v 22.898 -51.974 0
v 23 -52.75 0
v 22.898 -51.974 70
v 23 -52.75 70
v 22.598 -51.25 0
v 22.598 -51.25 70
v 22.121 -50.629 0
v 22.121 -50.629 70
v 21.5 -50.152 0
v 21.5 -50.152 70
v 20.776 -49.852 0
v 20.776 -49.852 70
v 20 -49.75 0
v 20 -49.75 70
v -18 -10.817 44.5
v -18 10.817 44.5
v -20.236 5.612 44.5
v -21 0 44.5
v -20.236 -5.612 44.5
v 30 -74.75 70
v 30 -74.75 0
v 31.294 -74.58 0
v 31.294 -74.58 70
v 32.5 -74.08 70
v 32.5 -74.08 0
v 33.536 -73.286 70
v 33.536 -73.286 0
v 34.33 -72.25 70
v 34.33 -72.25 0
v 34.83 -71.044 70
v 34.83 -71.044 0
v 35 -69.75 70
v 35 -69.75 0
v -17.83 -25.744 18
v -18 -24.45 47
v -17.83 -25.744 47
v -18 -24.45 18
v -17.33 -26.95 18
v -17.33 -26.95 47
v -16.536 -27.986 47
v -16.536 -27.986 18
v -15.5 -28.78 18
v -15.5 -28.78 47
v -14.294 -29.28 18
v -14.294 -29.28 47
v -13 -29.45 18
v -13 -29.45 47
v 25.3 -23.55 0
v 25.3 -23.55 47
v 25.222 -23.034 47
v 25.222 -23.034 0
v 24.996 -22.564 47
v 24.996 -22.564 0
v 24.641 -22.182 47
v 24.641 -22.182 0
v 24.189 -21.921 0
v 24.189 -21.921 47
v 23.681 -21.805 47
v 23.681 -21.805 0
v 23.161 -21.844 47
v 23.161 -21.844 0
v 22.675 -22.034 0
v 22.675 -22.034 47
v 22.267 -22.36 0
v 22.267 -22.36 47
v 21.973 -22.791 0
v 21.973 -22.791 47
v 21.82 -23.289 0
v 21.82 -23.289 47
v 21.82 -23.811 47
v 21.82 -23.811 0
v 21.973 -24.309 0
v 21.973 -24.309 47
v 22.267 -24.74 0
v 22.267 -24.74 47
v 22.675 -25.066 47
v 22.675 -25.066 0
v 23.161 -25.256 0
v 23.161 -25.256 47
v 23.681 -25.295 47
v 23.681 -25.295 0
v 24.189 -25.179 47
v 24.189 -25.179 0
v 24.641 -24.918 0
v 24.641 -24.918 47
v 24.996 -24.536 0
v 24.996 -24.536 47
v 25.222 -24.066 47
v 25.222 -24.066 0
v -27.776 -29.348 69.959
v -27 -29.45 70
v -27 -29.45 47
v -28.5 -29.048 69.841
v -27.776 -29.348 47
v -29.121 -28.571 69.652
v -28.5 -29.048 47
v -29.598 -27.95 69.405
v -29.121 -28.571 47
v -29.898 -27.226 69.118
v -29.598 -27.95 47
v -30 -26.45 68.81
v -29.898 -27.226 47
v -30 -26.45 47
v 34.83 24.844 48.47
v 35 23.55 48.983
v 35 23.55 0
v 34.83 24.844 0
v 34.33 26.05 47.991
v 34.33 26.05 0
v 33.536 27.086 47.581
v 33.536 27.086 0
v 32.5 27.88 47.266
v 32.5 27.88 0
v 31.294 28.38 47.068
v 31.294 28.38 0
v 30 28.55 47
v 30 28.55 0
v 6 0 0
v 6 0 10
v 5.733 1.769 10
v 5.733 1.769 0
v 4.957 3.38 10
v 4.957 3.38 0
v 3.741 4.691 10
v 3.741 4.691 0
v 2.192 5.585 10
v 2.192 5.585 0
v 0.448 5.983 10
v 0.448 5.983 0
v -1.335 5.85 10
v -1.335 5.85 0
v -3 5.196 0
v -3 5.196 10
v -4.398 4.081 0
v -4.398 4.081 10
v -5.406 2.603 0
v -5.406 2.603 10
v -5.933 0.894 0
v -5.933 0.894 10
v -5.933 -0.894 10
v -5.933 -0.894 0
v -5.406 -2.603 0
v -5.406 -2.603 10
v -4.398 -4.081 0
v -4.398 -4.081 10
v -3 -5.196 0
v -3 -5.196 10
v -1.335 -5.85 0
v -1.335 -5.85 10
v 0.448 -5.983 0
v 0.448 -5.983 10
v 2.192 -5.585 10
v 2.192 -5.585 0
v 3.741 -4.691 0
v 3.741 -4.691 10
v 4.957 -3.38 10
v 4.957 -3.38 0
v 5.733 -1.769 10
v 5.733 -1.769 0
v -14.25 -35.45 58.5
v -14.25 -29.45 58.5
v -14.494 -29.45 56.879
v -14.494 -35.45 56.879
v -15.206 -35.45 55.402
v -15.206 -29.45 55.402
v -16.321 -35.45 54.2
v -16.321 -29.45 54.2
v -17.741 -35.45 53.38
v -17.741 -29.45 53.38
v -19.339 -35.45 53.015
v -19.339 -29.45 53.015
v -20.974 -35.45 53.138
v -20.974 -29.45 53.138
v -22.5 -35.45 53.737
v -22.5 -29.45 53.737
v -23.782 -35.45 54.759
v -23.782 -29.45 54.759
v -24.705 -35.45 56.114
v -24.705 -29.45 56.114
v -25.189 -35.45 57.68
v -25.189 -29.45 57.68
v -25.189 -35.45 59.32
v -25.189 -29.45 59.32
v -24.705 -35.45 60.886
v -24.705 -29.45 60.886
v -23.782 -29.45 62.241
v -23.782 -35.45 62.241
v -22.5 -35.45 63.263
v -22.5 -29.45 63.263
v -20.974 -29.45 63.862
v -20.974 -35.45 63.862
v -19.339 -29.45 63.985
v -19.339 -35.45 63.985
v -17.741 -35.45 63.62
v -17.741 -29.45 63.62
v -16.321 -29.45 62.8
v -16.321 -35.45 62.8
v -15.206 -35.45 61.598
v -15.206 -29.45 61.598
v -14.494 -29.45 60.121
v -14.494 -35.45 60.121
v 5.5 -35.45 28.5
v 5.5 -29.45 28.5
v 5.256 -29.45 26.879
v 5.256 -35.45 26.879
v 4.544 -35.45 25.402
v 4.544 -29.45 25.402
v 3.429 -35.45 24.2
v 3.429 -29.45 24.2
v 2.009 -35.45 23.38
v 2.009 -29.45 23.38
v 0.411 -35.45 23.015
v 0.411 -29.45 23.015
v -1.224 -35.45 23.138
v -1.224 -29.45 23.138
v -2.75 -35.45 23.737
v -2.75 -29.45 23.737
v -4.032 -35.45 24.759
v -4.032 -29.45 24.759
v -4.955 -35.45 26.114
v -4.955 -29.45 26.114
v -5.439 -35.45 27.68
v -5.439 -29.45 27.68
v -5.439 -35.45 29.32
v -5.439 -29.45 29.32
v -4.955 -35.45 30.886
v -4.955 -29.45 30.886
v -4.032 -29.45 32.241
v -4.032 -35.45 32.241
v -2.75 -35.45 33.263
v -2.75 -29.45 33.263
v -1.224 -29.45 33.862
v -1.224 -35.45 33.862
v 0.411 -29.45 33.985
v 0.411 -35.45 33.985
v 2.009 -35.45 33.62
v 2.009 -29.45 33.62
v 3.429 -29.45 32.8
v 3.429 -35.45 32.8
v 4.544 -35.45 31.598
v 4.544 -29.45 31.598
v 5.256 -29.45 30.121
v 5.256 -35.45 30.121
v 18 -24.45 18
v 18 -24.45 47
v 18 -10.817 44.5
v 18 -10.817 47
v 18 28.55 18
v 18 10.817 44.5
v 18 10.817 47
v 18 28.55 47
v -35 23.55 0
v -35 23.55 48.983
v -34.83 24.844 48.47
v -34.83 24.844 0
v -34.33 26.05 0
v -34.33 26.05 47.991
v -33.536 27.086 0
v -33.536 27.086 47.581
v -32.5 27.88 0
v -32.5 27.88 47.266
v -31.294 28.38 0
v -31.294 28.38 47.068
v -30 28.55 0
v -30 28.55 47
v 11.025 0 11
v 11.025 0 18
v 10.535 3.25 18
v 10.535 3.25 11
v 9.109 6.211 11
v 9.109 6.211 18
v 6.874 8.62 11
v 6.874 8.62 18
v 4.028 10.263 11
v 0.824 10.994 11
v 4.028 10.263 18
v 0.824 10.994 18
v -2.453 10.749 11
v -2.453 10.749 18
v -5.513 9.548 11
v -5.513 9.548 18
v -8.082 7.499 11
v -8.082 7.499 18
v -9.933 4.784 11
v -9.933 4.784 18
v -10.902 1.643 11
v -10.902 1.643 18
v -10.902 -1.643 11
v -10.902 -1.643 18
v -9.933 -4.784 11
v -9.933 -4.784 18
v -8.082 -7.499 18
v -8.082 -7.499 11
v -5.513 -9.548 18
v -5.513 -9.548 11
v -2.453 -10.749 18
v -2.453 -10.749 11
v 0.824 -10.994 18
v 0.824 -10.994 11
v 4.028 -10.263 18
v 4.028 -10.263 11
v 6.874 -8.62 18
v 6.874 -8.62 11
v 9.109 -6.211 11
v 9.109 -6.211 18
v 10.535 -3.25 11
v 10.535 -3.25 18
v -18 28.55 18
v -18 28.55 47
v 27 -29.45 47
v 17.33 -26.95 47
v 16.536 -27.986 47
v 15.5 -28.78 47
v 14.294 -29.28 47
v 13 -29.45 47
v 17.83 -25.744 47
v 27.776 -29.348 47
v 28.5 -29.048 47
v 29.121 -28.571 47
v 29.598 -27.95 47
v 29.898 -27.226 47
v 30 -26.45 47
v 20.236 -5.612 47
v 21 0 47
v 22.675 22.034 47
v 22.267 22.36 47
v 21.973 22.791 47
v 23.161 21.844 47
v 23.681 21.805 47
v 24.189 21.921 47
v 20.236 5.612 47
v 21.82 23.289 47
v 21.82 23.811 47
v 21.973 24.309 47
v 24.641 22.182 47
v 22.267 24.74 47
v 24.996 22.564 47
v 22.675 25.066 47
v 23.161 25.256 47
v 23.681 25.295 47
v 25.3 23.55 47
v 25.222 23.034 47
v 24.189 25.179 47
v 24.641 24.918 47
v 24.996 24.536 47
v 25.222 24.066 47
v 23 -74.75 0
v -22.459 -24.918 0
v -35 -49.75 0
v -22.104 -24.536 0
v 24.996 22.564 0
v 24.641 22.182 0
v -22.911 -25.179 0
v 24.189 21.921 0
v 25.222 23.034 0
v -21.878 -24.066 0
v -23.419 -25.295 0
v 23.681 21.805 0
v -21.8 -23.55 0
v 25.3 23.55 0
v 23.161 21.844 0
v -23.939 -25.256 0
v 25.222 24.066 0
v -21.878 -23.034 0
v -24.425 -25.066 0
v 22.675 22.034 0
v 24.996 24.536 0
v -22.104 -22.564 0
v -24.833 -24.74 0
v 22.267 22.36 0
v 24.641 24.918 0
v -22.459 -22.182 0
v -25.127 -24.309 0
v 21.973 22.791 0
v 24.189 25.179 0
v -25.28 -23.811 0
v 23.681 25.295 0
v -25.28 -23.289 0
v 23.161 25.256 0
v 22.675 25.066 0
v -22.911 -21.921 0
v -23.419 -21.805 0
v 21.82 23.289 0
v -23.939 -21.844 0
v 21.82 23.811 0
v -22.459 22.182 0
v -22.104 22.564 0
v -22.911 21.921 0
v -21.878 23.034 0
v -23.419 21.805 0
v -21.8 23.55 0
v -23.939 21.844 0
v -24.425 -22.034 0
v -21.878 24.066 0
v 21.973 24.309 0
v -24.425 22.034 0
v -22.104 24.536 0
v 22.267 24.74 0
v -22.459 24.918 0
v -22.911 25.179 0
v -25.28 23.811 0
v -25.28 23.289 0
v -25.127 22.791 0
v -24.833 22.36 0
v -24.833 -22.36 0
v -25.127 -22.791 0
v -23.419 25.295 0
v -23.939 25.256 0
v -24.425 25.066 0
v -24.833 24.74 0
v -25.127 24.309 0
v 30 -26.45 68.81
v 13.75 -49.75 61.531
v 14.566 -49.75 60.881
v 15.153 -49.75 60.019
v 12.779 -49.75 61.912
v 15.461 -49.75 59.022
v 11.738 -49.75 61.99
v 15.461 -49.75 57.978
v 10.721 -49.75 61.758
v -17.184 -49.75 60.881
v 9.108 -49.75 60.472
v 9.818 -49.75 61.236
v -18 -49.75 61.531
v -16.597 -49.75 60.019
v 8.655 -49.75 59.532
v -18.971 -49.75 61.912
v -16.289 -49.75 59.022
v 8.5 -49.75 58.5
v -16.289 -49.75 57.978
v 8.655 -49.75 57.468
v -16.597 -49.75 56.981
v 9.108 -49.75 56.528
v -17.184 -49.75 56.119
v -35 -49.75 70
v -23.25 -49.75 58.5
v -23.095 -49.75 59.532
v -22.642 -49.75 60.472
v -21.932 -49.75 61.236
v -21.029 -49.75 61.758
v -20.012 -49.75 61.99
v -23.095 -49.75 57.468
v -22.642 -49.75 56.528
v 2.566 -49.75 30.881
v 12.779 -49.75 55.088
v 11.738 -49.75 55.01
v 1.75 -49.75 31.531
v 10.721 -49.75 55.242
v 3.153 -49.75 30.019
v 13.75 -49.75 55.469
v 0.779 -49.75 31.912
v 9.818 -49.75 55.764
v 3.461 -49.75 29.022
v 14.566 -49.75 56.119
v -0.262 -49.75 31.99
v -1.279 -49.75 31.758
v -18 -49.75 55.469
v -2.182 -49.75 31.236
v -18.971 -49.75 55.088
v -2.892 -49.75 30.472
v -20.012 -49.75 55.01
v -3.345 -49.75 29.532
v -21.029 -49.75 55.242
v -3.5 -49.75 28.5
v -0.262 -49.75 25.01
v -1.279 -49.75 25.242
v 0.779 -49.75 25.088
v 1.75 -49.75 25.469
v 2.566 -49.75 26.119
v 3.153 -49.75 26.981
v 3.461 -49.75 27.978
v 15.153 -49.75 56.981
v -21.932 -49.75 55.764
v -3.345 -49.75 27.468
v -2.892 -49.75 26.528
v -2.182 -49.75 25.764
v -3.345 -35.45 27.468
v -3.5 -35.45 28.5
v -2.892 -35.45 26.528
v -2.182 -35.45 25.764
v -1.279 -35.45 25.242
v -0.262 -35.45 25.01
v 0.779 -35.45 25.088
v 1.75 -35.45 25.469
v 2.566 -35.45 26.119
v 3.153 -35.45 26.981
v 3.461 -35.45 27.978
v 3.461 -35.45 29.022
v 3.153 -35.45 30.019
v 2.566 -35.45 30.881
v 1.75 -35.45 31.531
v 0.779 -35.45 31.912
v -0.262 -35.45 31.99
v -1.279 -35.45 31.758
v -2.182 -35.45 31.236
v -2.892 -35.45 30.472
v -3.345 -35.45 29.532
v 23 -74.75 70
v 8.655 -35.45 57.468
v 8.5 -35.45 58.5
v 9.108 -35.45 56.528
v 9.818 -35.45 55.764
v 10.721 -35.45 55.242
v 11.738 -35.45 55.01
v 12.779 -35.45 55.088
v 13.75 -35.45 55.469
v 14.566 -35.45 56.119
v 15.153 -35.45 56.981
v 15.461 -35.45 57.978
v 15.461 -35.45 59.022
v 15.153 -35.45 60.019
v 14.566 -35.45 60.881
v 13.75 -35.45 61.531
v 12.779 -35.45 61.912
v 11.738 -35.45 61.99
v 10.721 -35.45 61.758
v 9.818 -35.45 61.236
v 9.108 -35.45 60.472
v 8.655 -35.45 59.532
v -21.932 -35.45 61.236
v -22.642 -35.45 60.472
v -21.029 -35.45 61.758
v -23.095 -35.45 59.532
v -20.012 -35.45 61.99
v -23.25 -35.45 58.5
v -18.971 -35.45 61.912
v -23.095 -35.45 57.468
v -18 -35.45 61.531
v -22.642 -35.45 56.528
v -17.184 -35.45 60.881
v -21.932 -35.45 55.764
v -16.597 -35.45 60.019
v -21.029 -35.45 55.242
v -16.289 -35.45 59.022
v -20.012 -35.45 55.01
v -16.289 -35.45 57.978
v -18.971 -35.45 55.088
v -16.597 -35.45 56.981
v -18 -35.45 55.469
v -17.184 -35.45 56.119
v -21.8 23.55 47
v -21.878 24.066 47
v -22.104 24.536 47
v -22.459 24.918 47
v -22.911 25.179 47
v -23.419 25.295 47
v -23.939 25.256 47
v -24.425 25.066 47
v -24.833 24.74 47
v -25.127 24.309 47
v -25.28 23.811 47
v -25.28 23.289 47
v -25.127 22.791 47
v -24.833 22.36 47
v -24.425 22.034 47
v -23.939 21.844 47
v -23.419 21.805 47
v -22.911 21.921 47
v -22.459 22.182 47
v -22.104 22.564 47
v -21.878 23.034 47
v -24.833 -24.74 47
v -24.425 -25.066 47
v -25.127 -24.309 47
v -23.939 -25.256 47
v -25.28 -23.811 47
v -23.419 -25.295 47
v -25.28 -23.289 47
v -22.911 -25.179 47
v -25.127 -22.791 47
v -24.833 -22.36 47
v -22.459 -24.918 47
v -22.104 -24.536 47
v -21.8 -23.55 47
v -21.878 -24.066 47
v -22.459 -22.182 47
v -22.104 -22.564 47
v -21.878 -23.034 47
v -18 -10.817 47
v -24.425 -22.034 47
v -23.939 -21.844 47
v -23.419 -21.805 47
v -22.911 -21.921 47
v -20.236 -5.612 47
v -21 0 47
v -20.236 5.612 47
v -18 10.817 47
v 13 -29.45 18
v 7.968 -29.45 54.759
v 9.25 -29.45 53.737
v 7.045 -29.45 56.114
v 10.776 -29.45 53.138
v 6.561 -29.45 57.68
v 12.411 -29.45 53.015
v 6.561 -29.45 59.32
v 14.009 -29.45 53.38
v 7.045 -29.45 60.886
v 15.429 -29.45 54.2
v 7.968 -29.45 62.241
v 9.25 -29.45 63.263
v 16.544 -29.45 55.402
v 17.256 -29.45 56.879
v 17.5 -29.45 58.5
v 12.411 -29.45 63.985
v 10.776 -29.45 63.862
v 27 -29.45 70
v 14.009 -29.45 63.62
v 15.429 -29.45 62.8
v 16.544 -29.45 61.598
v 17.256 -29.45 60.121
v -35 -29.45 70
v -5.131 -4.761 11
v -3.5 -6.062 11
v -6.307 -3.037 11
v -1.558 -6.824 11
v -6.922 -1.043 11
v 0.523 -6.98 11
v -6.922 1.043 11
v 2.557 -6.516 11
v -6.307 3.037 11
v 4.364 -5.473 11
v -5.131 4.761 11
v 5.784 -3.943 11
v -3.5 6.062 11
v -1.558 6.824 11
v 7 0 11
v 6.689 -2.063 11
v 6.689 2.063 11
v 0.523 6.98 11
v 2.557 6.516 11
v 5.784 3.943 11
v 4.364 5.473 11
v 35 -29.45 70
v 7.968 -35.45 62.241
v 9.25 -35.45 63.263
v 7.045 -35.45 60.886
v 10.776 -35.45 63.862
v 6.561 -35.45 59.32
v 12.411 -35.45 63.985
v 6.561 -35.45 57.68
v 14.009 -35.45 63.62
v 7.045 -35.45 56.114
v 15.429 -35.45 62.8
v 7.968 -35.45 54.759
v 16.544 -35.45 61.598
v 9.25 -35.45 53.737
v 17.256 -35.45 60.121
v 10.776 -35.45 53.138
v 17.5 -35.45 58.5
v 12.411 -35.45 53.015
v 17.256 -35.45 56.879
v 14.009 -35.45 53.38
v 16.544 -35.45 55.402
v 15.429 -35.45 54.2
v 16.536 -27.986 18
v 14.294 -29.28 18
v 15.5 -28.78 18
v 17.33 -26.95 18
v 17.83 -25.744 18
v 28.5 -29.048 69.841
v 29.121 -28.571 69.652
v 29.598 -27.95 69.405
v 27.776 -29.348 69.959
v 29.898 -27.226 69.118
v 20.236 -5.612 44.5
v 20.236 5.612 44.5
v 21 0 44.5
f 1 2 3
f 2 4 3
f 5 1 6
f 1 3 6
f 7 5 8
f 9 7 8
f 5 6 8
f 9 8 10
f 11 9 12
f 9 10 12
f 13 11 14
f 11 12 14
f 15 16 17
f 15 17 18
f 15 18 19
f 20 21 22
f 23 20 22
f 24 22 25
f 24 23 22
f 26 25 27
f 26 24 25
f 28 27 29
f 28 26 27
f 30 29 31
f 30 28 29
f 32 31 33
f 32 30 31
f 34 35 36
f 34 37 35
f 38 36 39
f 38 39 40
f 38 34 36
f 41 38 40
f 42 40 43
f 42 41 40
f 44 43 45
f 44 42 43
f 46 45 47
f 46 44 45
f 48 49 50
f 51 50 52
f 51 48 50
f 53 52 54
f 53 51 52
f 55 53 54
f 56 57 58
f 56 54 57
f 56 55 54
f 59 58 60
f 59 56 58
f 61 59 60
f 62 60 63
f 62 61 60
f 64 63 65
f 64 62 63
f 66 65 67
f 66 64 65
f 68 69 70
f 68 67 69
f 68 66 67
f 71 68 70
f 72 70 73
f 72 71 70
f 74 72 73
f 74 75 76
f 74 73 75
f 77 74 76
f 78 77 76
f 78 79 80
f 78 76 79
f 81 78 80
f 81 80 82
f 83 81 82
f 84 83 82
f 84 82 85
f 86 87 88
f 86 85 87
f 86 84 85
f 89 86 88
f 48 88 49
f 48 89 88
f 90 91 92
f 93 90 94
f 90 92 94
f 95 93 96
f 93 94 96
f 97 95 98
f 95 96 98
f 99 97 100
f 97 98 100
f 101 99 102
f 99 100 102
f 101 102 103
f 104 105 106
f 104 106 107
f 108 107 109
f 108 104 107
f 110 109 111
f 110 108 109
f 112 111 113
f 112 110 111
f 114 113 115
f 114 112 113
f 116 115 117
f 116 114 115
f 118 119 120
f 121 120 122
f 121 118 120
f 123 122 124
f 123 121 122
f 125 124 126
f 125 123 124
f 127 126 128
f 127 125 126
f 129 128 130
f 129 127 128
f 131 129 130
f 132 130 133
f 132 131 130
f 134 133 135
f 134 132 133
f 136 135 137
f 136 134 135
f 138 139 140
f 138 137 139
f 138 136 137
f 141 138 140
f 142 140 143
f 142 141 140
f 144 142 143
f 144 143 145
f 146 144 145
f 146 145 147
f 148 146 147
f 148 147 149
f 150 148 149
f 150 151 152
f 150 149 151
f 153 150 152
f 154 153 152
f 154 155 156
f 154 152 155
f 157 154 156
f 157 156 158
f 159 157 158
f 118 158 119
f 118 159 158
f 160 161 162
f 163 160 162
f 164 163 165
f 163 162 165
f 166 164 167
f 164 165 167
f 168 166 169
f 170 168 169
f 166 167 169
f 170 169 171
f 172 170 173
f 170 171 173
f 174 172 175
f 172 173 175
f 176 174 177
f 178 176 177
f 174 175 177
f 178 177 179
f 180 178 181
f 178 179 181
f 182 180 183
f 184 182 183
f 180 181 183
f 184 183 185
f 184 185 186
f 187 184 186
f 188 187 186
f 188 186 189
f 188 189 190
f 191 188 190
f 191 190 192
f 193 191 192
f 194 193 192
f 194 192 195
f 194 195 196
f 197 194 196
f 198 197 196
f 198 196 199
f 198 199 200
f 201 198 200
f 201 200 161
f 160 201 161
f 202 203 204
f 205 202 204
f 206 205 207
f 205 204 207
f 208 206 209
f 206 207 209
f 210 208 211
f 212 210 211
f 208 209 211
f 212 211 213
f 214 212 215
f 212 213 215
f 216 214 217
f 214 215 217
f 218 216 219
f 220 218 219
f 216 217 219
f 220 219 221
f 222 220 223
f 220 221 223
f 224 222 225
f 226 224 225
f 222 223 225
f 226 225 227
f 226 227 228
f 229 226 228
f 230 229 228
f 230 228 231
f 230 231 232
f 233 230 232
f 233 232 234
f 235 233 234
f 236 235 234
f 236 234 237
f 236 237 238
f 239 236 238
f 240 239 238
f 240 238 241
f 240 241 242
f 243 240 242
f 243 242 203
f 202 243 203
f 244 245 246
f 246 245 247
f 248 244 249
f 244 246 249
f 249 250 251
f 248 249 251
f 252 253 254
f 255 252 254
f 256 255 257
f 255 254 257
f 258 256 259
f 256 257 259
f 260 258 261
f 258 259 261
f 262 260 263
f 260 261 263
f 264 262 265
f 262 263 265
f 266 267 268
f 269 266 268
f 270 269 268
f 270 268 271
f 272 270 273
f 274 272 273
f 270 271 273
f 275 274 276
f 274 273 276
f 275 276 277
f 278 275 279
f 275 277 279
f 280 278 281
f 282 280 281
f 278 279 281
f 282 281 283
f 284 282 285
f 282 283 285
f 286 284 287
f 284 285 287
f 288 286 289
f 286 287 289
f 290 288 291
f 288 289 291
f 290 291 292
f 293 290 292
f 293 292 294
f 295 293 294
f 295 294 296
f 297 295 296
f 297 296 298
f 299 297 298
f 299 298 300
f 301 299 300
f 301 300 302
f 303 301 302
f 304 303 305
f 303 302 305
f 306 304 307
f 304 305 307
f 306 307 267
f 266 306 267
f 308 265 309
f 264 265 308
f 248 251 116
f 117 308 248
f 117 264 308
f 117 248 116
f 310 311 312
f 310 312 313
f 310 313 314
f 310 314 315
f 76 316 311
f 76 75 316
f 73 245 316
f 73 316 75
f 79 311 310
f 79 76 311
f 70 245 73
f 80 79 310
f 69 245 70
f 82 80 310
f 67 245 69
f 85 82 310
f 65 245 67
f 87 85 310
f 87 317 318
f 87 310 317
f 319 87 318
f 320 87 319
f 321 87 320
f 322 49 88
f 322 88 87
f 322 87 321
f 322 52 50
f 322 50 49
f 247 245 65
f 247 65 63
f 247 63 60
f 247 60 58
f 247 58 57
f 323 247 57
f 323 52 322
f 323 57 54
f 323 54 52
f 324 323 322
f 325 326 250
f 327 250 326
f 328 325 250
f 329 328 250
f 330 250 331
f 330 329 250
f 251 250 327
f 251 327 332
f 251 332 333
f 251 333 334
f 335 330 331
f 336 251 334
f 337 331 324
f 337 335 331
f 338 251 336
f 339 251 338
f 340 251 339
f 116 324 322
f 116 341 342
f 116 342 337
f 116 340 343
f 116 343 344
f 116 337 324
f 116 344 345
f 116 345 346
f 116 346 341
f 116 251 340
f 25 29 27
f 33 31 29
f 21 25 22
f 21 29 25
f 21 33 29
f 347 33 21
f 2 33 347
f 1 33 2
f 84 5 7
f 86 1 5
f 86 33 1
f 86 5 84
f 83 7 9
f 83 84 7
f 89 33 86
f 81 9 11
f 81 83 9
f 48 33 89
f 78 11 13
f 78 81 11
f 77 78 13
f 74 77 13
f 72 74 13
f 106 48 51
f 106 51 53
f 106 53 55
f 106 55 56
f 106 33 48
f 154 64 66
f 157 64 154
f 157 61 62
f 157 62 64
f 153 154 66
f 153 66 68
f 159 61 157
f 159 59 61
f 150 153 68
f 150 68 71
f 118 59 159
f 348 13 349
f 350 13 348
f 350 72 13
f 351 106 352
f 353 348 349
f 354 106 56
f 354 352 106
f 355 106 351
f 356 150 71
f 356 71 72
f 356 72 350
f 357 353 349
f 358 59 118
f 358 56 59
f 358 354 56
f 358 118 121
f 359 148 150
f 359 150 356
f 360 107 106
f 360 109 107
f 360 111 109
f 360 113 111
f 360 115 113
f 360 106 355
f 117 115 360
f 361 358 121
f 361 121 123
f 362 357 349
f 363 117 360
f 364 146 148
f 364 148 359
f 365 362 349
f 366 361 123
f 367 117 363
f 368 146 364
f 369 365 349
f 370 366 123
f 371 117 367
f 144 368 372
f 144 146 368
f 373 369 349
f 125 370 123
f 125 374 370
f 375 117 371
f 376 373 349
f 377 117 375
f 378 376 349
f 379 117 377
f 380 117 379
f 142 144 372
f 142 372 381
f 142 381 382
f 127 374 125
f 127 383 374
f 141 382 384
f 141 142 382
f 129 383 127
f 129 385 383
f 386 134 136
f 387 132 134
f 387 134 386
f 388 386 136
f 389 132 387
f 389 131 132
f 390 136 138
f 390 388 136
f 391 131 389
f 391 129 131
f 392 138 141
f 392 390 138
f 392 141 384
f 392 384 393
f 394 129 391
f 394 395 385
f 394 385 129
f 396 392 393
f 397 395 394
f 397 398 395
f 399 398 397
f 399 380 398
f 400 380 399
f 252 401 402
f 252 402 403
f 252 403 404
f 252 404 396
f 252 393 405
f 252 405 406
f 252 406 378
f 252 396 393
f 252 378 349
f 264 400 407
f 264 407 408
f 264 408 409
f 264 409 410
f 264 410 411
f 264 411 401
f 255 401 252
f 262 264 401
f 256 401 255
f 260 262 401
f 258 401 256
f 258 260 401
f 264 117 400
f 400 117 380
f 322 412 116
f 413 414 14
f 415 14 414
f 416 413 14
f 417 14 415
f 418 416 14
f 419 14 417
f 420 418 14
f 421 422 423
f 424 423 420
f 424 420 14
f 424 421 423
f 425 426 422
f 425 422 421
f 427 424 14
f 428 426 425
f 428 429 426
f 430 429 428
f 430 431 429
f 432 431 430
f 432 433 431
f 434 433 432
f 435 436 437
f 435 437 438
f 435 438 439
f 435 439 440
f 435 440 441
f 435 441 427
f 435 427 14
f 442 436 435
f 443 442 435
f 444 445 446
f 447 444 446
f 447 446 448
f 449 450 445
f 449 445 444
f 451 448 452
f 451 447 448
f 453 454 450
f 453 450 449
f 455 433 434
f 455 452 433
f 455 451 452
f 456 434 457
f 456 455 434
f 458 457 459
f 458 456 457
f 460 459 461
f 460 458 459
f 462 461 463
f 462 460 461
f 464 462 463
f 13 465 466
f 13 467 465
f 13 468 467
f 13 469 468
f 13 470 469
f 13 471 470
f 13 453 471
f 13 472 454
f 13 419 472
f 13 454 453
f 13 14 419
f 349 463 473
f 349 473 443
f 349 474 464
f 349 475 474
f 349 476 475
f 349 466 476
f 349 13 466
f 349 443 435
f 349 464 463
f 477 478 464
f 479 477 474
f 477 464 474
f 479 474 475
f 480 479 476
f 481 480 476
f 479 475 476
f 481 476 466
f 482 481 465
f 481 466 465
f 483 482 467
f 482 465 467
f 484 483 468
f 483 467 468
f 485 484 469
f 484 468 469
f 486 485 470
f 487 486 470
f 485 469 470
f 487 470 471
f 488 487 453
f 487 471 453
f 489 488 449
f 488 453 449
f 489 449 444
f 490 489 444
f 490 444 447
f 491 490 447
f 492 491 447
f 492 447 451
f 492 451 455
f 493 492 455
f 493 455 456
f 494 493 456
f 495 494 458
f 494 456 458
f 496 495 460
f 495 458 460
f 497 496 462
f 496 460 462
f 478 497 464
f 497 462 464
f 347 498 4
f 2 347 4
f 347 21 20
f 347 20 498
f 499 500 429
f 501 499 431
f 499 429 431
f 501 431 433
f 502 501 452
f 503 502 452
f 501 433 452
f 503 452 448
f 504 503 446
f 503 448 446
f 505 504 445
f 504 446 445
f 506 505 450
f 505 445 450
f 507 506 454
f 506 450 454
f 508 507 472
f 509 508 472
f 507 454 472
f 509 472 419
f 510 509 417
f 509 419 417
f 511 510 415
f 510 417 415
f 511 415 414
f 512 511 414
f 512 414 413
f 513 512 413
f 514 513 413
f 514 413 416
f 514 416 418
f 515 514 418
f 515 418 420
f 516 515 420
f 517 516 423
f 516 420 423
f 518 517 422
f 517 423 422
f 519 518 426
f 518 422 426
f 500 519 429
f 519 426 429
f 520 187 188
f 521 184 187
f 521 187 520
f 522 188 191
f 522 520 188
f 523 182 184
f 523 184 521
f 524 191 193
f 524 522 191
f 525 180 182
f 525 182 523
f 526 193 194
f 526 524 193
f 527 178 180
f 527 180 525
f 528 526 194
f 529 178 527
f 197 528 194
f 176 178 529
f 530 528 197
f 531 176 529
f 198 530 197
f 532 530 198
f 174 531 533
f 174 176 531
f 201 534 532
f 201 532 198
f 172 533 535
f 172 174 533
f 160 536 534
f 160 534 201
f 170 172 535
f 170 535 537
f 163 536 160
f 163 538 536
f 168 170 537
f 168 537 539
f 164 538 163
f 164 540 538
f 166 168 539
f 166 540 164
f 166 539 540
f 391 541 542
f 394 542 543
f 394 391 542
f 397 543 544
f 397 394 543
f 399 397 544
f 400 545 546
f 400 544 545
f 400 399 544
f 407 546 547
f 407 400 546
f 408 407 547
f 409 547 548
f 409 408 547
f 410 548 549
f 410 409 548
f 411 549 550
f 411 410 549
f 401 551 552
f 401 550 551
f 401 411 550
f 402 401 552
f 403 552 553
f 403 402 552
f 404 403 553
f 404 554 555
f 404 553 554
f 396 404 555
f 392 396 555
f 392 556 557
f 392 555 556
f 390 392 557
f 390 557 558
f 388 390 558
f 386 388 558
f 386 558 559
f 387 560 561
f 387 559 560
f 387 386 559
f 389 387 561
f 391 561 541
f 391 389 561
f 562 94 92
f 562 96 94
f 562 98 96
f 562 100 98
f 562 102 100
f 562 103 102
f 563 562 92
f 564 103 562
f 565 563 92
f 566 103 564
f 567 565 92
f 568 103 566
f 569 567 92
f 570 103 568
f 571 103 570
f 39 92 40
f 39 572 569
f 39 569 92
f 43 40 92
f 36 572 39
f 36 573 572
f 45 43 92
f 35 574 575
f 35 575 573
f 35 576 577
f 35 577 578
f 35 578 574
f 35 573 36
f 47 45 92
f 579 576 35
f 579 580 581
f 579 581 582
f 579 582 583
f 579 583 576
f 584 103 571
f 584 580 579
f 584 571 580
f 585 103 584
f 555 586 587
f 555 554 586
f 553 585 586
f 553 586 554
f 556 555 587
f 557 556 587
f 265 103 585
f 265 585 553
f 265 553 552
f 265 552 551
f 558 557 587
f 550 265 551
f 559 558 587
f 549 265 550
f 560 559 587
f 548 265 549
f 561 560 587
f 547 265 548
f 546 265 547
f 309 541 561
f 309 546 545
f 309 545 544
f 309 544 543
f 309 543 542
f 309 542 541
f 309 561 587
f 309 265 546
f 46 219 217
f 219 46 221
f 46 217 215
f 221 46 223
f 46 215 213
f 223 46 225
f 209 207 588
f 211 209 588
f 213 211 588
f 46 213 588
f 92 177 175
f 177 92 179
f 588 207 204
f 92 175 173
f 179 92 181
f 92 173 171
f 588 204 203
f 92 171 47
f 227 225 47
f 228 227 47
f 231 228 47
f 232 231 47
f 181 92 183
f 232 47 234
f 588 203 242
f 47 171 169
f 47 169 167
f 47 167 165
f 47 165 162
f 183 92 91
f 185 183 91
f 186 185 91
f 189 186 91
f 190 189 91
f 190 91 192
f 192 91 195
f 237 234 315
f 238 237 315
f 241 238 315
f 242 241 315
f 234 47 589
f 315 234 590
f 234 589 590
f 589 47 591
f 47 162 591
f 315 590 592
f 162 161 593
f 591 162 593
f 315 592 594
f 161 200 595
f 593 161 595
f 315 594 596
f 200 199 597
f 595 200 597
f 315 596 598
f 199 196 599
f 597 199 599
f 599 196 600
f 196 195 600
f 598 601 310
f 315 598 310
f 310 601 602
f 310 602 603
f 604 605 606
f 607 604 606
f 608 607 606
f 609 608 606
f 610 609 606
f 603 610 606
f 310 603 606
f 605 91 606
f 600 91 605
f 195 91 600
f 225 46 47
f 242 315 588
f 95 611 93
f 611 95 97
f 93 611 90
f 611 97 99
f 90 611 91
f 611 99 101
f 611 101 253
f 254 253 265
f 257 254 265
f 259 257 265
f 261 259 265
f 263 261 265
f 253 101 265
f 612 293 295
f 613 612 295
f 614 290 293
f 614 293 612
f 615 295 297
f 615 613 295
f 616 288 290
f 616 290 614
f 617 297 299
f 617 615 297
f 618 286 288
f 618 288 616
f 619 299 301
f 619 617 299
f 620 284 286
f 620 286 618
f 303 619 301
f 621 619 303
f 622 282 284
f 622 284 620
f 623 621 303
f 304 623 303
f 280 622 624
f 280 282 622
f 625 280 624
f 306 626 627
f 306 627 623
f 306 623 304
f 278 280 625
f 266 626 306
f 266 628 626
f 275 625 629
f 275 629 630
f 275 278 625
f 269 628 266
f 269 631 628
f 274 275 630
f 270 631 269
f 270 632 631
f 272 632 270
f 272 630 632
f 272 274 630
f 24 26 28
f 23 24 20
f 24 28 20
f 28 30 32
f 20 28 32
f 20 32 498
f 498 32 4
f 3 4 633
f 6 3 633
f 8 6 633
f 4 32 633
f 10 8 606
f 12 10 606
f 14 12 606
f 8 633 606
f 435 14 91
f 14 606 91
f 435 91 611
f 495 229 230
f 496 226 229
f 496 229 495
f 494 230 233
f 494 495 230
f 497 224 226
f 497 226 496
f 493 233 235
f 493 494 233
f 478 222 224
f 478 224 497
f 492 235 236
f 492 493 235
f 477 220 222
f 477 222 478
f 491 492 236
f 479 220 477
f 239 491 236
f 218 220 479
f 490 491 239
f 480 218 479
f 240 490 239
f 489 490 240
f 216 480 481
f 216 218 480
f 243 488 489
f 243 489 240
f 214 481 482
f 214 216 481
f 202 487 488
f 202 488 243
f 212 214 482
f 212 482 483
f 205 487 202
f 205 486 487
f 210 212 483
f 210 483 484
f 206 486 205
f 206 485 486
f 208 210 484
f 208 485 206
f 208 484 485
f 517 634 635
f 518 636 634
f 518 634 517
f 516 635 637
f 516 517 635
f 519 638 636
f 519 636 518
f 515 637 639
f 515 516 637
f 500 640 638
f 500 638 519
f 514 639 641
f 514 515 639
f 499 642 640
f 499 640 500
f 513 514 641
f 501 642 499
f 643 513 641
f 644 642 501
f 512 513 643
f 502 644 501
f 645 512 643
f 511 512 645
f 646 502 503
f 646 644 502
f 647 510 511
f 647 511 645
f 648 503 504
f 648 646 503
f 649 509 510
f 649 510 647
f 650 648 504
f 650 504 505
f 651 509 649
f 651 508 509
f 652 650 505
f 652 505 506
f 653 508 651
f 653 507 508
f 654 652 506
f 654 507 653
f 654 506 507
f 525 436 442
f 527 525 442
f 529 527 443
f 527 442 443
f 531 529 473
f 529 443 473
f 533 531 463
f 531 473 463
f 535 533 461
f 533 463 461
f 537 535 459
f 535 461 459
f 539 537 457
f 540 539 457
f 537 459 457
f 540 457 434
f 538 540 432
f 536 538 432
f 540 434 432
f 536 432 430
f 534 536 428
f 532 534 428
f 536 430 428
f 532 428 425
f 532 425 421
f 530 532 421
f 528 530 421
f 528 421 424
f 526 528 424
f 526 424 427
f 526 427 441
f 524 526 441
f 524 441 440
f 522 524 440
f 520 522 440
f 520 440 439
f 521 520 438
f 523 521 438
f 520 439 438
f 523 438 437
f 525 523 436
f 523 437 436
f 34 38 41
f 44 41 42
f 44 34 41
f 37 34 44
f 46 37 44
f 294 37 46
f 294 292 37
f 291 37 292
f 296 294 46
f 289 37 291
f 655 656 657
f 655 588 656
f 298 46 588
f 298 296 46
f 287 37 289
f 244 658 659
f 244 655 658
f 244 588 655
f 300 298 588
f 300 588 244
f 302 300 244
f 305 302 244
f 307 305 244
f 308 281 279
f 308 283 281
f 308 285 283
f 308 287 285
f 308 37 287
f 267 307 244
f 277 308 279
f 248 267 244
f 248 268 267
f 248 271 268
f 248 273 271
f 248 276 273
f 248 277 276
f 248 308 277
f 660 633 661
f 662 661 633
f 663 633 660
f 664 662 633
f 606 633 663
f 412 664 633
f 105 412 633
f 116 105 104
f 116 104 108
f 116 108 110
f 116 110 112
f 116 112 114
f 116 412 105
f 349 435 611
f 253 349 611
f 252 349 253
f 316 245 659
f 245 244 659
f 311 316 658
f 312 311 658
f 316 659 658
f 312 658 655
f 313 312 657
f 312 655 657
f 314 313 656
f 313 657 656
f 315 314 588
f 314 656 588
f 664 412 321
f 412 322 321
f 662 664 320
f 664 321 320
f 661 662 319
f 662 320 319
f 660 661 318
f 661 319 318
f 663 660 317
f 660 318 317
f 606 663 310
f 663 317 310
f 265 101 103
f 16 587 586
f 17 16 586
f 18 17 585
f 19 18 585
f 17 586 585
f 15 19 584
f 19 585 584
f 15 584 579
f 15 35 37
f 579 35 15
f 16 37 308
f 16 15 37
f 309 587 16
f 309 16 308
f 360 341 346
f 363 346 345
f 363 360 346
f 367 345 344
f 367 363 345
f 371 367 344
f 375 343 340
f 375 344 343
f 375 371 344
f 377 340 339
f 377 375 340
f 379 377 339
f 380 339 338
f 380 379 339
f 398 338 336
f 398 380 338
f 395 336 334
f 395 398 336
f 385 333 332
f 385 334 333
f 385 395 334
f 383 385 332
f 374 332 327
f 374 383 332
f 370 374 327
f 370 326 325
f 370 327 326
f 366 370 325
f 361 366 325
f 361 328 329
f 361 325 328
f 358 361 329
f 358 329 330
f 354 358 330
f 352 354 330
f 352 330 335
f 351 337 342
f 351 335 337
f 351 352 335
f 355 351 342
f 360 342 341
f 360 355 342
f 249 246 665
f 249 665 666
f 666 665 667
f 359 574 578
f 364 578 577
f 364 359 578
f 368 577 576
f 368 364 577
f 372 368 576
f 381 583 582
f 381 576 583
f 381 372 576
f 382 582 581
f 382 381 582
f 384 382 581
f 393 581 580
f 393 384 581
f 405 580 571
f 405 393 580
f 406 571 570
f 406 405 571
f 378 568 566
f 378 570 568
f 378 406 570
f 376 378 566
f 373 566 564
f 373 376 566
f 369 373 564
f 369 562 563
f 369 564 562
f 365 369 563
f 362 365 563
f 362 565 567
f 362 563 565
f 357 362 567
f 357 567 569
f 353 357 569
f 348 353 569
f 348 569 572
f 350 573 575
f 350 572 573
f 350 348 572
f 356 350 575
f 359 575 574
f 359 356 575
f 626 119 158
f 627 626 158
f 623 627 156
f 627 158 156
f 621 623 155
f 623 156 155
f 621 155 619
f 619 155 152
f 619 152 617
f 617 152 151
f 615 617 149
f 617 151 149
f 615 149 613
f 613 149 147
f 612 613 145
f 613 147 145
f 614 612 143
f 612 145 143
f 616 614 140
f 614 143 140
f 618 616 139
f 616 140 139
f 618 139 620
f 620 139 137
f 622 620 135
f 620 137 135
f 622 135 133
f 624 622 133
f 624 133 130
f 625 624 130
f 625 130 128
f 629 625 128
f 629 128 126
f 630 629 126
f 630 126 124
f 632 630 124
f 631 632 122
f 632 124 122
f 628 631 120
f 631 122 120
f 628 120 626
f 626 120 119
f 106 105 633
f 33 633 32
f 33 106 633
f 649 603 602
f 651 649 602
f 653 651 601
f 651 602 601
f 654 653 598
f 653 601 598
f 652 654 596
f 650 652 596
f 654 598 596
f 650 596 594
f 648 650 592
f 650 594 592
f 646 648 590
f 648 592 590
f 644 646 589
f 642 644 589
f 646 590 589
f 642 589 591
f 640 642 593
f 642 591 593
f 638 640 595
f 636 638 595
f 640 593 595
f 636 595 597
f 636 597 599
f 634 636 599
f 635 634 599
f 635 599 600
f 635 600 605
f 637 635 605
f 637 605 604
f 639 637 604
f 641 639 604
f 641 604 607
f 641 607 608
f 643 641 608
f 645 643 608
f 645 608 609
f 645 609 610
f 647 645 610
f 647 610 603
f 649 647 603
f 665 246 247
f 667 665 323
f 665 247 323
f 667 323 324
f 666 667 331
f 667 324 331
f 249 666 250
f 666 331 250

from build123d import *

# Parameters (mm, degrees)
SKETCH1_R                                       = 1.75
SKETCH1_R_2                                     = 6
BOSS_EXTRUDE1_DEPTH                             = 70
SKETCH2_W                                       = 36
SKETCH2_H                                       = 58
CUT_EXTRUDE1_DEPTH                              = 52
SKETCH3_W                                       = 60
SKETCH3_H                                       = 58
CUT_EXTRUDE2_DEPTH                              = 23
SKETCH4_R                                       = 21
CUT_EXTRUDE3_DEPTH                              = 2.5
FILLET2_R                                       = 5
FILLET3_R                                       = 3
SKETCH5_R                                       = 11.025
CUT_EXTRUDE4_DEPTH                              = 7
CBORE_FOR_M6_SOCKET_HEAD_CAP_SCREW1_D           = 7
CBORE_FOR_M6_SOCKET_HEAD_CAP_SCREW1_CBORE_D     = 11
CBORE_FOR_M6_SOCKET_HEAD_CAP_SCREW1_CBORE_DEPTH = 6
SKETCH8_W                                       = 59.674444403
SKETCH8_H                                       = 31.446844148
CUT_EXTRUDE5_DEPTH                              = 71.0000001
CUT_EXTRUDE6_DEPTH                              = 36
CUT_EXTRUDE6_DEPTH_BACK                         = 36
CHAMFER1_SIZE                                   = 1


with BuildPart() as part:
    # Sketch1 → Boss-Extrude1 (new body)
    with BuildSketch(Plane.XY):
        Polygon((-35, -74.75), (-35, 28.55), (35, 28.55), (35, -74.75), (23, -74.75), (23, -49.75), (-23, -49.75), (-23, -74.75), align=None)
        with Locations((-23.55, 23.55)):
            Circle(SKETCH1_R, mode=Mode.SUBTRACT)
        with Locations((23.55, -23.55)):
            Circle(SKETCH1_R, mode=Mode.SUBTRACT)
        with Locations((23.55, 23.55)):
            Circle(SKETCH1_R, mode=Mode.SUBTRACT)
        with Locations((-23.55, -23.55)):
            Circle(SKETCH1_R, mode=Mode.SUBTRACT)
        Circle(SKETCH1_R_2, mode=Mode.SUBTRACT)
    extrude(amount=BOSS_EXTRUDE1_DEPTH)

    # Sketch2 → Cut-Extrude1 (cut)
    with BuildSketch(Plane.XY.offset(70)):
        with Locations((0, -0.45)):
            Rectangle(SKETCH2_W, SKETCH2_H)
    extrude(amount=-CUT_EXTRUDE1_DEPTH, mode=Mode.SUBTRACT)

    # Sketch3 → Cut-Extrude2 (cut)
    with BuildSketch(Plane.XY.offset(70)):
        with Locations((0, -0.45)):
            Rectangle(SKETCH3_W, SKETCH3_H)
    extrude(amount=-CUT_EXTRUDE2_DEPTH, mode=Mode.SUBTRACT)

    # Sketch4 → Cut-Extrude3 (cut)
    with BuildSketch(Plane.XY.offset(47)):
        Circle(SKETCH4_R)
    extrude(amount=-CUT_EXTRUDE3_DEPTH, mode=Mode.SUBTRACT)

    # Fillet2
    fillet2_edges = [part.edges().sort_by_distance(p)[0] for p in [
        (35, -74.75, 35),
        (-35, -74.75, 35),
        (35, 28.55, 35),
        (-35, 28.55, 35),
        (18, -29.45, 32.5),
        (-18, -29.45, 32.5),
    ]]
    fillet(fillet2_edges, radius=FILLET2_R)

    # Fillet3
    fillet3_edges = [part.edges().sort_by_distance(p)[0] for p in [
        (23, -49.75, 35),
        (-23, -49.75, 35),
        (30, -29.45, 58.5),
        (-30, -29.45, 58.5),
    ]]
    fillet(fillet3_edges, radius=FILLET3_R)

    # Sketch5 → Cut-Extrude4 (cut)
    with BuildSketch(Plane.XY.offset(18)):
        Circle(SKETCH5_R)
    extrude(amount=-CUT_EXTRUDE4_DEPTH, mode=Mode.SUBTRACT)

    # CBORE for M6 Socket Head Cap Screw1 (through all)
    with Locations(Plane(origin=(0, -29.45, 0), x_dir=(1, 0, 0), z_dir=(0, 1, 0))):
        with Locations((0, -28.5), (-19.75, -58.5), (12, -58.5)):
            CounterBoreHole(CBORE_FOR_M6_SOCKET_HEAD_CAP_SCREW1_D / 2, CBORE_FOR_M6_SOCKET_HEAD_CAP_SCREW1_CBORE_D / 2, CBORE_FOR_M6_SOCKET_HEAD_CAP_SCREW1_CBORE_DEPTH)

    # Sketch8 → Cut-Extrude5 (cut, through all)
    with BuildSketch(Plane.XY.offset(70)):
        with Locations((-33.952701125, -65.473422074)):
            Rectangle(SKETCH8_W, SKETCH8_H)
    extrude(amount=-CUT_EXTRUDE5_DEPTH, mode=Mode.SUBTRACT)

    # Sketch9 → Cut-Extrude6 (cut, two sides)
    with BuildSketch(Plane(origin=(0, 0, 0), x_dir=(0, 0, -1), z_dir=(1, 0, 0))) as cut_extrude6_sk:
        Polygon((-47, 28.55), (-70, 28.55), (-70, -29.45), align=None)
    extrude(amount=CUT_EXTRUDE6_DEPTH, mode=Mode.SUBTRACT)
    extrude(cut_extrude6_sk.sketch, amount=-CUT_EXTRUDE6_DEPTH_BACK, mode=Mode.SUBTRACT)

    # Chamfer1
    chamfer1_edges = [part.edges().sort_by_distance(p)[0] for p in [
        (-6, 0, 11),
    ]]
    chamfer(chamfer1_edges, length=CHAMFER1_SIZE)


solid = part.part
